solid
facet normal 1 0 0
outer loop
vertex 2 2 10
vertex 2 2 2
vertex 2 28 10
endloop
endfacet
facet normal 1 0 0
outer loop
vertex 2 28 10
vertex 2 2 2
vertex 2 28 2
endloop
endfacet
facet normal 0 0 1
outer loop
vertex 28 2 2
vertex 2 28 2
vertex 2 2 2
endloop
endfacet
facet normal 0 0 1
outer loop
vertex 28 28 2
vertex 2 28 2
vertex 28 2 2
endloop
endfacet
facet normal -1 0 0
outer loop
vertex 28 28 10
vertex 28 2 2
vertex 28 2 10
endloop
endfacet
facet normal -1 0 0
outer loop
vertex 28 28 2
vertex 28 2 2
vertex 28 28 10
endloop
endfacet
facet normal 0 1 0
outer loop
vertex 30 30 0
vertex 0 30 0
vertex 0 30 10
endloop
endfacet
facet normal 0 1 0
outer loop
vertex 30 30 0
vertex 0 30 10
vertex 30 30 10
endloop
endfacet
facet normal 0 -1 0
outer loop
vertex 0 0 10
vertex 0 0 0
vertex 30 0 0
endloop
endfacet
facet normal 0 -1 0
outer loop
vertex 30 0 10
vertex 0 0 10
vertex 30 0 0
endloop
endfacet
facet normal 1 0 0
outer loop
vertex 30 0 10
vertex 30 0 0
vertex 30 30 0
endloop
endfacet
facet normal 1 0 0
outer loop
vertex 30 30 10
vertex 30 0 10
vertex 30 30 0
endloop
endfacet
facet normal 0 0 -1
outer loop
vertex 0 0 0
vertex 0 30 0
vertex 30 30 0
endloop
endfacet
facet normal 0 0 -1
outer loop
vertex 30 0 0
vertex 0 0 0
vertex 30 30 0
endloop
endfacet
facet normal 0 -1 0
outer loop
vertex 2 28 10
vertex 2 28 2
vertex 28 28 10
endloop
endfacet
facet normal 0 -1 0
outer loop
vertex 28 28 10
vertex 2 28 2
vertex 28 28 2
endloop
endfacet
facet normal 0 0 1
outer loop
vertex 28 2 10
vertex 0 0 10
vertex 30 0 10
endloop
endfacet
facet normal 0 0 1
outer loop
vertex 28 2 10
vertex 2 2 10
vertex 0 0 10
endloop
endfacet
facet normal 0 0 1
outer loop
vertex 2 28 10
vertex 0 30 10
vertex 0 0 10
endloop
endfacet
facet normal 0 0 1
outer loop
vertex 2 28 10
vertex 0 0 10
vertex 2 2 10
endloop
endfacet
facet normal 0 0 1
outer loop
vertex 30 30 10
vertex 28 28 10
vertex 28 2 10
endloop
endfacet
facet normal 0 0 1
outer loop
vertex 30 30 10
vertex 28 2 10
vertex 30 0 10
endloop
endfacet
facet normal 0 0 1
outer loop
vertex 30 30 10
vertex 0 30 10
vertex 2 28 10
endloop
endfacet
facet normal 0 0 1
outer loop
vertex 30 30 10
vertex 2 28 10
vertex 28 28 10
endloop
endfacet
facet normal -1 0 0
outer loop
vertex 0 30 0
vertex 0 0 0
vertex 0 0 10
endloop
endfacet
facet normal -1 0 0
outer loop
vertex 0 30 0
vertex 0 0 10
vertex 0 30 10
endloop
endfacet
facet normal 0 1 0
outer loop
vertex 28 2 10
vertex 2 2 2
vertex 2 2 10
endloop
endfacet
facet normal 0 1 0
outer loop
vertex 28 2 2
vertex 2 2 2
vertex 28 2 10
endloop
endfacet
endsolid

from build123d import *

# Parameters (mm, degrees)
BOX_W        = 30
BOX_H        = 30
BOX_DEPTH    = 10
BOX001_W     = 26
BOX001_H     = 26
BOX001_DEPTH = 8


with BuildPart() as part:
    # Box → Box (join)
    with BuildSketch(Plane.XY):
        with Locations((15, 15)):
            Rectangle(BOX_W, BOX_H)
    extrude(amount=BOX_DEPTH)

    # Box001 → Box001 (cut)
    with BuildSketch(Plane(origin=(2, 2, 2), x_dir=(1, 0, 0), z_dir=(0, 0, 1))):
        with Locations((13, 13)):
            Rectangle(BOX001_W, BOX001_H)
    extrude(amount=BOX001_DEPTH, mode=Mode.SUBTRACT)


solid = part.part
